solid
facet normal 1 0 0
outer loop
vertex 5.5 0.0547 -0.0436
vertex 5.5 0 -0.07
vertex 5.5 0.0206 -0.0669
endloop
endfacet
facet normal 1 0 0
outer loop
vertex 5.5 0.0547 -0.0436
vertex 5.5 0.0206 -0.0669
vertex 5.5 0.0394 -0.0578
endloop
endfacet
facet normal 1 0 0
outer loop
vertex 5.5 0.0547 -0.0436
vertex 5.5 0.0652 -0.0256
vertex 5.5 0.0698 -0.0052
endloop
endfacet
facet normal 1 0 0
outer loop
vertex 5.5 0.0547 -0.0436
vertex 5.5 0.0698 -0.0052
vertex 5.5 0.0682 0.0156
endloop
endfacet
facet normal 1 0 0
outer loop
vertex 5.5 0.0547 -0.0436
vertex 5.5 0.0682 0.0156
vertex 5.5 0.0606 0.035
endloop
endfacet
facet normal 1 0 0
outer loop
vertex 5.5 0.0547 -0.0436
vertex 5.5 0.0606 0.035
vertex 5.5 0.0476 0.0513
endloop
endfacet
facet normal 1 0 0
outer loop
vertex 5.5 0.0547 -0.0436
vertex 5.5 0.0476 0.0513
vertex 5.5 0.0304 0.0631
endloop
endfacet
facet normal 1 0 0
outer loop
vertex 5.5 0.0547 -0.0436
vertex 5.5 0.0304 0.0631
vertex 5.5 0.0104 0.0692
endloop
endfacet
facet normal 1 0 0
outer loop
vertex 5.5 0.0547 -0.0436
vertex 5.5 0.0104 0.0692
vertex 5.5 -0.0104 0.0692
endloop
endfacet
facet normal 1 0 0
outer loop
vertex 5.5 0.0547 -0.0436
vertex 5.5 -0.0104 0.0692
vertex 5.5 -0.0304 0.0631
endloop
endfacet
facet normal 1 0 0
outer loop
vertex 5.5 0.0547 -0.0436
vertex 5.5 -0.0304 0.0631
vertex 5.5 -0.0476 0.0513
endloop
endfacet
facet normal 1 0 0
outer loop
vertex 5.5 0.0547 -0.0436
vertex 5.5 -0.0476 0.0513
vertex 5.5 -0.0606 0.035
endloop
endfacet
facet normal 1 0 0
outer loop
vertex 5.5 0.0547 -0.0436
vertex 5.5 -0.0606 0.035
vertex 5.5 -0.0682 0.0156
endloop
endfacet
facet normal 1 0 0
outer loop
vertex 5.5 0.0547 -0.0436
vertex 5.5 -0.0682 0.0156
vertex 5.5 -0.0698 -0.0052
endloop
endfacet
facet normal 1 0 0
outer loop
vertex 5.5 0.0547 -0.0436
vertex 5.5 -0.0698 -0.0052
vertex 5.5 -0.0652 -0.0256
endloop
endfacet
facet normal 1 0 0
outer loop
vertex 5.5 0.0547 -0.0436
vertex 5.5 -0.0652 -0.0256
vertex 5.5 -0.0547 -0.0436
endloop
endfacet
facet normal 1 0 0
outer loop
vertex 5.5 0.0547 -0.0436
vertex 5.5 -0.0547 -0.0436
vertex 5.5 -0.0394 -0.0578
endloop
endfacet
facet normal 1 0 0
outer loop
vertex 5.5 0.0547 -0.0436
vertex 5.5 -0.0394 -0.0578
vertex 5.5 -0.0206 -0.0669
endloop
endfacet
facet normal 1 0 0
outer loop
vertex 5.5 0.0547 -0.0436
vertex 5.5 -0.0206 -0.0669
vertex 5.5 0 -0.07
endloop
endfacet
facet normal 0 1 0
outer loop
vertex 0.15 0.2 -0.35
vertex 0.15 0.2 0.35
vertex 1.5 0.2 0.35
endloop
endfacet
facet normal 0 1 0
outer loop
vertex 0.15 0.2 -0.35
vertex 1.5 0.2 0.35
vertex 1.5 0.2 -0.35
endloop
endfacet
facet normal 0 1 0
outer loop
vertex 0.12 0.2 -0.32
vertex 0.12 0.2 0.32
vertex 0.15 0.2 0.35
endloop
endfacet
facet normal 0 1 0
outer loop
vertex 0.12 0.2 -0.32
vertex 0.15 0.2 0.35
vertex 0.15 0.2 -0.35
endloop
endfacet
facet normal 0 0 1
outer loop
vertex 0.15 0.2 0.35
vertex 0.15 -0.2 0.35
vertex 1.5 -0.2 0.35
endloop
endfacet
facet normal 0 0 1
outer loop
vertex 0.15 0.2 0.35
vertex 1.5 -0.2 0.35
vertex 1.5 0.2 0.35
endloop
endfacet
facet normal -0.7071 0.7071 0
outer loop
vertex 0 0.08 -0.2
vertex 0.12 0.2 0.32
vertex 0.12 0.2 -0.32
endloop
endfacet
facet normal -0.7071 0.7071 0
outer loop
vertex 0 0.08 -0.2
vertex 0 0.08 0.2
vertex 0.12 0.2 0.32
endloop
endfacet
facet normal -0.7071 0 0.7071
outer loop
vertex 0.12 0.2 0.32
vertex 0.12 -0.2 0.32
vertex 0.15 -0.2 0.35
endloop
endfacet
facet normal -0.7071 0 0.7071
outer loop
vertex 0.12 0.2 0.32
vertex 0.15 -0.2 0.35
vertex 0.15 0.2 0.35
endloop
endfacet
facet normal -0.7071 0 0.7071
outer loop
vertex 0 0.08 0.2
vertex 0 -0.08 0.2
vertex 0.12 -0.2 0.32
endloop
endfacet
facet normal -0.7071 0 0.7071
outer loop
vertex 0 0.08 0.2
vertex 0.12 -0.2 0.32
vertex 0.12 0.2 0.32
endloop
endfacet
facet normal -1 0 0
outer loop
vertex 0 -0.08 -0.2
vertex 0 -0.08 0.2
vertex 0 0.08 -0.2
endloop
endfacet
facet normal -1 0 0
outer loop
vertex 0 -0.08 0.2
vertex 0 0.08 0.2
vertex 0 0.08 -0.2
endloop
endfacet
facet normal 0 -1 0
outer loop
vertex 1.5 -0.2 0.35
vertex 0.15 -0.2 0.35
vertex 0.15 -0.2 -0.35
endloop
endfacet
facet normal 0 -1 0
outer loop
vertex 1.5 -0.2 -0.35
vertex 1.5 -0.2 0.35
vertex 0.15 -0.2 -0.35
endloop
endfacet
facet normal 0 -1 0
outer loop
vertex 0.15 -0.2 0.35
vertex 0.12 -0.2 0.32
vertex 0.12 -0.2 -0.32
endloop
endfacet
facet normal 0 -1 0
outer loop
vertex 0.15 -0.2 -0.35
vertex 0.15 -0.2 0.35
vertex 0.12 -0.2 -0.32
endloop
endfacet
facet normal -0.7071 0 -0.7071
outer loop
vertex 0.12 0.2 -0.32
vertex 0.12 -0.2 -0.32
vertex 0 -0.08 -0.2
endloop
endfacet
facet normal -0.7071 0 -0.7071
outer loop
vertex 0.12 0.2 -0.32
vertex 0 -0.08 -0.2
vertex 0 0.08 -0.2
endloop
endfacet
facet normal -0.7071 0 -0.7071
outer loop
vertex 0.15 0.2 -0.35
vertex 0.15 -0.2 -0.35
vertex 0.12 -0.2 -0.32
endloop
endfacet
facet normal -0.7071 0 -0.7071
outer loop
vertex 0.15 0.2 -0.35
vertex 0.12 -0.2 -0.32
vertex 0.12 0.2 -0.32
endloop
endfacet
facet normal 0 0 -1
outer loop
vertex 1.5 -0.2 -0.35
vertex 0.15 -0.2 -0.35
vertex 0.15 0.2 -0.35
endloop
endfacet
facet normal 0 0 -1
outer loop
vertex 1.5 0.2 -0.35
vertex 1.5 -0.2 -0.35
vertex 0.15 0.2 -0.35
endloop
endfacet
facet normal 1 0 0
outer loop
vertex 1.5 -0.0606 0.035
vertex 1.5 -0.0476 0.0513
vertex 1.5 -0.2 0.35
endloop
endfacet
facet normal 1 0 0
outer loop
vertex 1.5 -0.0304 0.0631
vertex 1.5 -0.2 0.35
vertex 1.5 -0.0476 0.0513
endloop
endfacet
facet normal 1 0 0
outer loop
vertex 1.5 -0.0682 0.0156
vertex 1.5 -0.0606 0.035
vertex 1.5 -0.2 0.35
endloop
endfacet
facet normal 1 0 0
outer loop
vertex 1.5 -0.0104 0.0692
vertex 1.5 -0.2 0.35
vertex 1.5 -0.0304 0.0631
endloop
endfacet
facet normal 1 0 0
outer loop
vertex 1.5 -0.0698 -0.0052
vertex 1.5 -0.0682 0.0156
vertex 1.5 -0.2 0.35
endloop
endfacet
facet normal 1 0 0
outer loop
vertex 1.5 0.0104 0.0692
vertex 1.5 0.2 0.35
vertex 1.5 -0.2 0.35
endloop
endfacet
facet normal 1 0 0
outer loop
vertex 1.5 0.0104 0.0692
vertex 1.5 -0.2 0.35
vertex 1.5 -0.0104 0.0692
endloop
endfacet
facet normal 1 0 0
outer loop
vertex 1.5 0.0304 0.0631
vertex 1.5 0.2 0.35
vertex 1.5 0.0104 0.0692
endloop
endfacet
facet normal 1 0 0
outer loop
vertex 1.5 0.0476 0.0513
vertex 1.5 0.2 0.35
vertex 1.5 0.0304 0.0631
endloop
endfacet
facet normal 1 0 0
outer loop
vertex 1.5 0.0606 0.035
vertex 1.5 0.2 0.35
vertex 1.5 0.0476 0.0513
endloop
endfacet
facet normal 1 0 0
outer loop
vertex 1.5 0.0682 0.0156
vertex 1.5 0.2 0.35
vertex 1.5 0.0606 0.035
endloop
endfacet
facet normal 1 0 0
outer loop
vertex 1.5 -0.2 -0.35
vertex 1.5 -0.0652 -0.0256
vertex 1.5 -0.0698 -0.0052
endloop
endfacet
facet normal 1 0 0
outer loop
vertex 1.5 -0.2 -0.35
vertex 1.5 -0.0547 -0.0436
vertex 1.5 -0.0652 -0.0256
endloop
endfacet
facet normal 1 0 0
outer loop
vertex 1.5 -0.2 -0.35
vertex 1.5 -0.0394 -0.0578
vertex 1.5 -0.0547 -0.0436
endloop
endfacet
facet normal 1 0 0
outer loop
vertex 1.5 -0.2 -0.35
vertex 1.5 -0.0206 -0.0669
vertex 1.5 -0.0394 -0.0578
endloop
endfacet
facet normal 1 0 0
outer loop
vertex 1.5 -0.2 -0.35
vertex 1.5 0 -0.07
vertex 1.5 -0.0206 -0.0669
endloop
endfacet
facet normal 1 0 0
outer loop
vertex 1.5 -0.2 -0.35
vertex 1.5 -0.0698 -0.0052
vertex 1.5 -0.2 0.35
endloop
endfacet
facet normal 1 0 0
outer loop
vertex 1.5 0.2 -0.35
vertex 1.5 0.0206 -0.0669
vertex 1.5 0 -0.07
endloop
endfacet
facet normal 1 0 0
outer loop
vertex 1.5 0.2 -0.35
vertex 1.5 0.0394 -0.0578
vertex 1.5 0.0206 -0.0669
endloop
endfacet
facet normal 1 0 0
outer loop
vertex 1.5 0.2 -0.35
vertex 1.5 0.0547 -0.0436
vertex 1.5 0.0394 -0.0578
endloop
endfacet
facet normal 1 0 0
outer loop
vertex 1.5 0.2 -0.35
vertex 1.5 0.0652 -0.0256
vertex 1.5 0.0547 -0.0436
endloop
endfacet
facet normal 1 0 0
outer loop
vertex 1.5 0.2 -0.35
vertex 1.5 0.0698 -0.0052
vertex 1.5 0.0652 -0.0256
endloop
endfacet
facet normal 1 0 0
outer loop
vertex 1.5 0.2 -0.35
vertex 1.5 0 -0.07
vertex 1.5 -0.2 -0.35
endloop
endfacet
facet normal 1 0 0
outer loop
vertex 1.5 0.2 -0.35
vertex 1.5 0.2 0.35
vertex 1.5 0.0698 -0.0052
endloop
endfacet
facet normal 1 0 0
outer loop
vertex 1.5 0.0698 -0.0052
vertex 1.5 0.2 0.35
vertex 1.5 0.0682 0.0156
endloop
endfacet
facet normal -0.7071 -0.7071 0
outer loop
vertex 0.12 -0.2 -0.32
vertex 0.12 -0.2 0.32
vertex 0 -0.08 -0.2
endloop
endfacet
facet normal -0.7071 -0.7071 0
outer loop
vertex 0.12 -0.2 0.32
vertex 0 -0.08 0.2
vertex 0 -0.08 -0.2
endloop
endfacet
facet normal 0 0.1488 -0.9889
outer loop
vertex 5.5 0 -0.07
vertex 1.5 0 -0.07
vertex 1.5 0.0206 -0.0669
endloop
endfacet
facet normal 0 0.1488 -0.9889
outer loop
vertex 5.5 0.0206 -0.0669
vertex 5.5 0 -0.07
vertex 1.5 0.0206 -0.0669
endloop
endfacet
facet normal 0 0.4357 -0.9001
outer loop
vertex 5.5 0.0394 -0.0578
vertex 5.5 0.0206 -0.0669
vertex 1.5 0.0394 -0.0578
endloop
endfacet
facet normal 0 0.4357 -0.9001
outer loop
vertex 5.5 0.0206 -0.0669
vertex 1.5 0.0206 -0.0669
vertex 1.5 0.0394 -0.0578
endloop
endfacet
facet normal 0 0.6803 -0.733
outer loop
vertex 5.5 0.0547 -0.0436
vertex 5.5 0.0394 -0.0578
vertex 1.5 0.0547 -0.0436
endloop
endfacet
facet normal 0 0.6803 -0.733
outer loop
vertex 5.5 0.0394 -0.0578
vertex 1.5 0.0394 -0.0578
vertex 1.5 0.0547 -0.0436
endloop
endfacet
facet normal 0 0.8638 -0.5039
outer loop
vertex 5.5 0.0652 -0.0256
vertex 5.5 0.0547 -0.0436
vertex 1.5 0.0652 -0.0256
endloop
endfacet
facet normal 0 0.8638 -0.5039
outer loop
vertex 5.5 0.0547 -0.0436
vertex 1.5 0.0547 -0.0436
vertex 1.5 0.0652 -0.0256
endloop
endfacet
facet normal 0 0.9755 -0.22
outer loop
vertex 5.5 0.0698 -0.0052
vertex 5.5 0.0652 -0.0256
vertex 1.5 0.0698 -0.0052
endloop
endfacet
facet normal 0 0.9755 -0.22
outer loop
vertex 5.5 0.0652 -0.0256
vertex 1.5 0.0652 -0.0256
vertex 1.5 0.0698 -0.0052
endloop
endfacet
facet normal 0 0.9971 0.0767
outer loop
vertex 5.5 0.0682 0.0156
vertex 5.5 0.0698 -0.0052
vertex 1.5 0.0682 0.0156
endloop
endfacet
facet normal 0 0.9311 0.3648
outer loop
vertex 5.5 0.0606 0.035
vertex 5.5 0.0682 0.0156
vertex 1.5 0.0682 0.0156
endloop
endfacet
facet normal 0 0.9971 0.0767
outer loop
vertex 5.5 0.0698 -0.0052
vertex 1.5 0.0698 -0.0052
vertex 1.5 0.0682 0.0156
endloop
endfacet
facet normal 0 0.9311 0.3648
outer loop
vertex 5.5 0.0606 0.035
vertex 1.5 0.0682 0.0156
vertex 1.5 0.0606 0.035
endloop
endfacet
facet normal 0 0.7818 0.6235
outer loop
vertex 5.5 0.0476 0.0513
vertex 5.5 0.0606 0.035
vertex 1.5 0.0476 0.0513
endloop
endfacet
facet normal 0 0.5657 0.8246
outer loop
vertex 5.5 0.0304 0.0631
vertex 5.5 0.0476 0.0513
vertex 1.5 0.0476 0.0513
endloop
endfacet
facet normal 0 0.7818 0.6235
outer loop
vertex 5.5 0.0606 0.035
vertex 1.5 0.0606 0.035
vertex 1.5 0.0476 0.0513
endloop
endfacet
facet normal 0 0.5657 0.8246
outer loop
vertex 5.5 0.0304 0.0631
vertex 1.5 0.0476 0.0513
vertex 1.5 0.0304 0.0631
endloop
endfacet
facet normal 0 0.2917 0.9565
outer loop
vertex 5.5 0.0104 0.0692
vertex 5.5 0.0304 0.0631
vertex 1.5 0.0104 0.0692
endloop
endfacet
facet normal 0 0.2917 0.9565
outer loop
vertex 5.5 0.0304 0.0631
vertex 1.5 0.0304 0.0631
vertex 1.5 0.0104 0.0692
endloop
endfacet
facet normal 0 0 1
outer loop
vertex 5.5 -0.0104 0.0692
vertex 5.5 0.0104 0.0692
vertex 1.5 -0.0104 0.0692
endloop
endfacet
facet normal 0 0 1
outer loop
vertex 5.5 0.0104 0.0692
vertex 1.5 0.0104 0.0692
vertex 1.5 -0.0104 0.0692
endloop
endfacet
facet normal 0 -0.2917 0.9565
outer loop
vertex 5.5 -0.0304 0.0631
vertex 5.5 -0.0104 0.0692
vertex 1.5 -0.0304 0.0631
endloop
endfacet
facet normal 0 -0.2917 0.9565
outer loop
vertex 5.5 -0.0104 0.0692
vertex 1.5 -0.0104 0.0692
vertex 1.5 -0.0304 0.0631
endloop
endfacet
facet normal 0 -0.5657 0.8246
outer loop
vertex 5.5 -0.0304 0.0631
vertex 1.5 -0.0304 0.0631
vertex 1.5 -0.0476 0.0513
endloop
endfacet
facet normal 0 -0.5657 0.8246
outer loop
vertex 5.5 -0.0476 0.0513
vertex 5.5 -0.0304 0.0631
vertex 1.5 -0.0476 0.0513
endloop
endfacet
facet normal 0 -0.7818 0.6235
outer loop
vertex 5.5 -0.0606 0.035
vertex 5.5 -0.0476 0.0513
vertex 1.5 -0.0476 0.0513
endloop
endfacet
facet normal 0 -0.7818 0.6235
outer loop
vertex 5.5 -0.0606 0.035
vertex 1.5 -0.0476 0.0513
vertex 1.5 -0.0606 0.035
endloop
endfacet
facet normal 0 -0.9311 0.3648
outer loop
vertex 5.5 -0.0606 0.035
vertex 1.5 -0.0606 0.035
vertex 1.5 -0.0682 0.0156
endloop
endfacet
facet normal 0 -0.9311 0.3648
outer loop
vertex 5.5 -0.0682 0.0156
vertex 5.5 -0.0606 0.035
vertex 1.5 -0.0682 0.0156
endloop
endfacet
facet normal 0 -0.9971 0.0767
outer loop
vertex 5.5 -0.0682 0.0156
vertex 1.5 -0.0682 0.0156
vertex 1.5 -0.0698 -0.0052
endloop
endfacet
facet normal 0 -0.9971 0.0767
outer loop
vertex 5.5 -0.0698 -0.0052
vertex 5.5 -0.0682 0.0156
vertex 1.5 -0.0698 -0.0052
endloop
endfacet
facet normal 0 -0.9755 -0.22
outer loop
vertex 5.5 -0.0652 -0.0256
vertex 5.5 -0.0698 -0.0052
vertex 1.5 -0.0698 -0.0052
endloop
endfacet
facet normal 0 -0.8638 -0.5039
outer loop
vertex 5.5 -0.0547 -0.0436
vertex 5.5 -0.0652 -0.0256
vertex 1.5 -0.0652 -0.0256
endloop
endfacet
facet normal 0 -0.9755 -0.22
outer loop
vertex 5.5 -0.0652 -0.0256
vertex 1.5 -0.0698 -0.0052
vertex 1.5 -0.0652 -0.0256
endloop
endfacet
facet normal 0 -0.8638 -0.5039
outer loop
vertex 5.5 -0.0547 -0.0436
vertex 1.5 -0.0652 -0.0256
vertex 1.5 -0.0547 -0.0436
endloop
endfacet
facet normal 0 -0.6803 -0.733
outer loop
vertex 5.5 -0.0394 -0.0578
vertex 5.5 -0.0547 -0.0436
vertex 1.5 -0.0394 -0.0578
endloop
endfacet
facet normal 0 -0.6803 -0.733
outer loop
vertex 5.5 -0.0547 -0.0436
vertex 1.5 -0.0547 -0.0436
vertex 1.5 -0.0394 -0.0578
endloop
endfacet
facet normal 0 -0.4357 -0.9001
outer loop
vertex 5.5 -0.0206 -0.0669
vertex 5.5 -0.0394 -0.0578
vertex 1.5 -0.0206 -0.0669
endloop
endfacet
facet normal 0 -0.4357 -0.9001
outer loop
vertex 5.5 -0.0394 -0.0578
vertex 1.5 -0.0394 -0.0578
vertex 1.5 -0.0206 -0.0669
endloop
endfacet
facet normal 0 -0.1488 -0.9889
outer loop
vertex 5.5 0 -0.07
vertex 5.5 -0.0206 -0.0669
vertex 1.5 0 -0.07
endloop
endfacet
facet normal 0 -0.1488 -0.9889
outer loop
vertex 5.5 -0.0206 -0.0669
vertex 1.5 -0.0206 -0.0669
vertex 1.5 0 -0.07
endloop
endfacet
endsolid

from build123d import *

# Parameters (mm, degrees)
SKETCH1_W           = 0.7
SKETCH1_H           = 0.4
BOSS_EXTRUDE1_DEPTH = 1.5
SKETCH2_R           = 0.07
BOSS_EXTRUDE2_DEPTH = 4
CHAMFER1_SIZE       = 0.12
CHAMFER2_SIZE       = 0.15


with BuildPart() as part:
    # Sketch1 → Boss-Extrude1 (new body)
    with BuildSketch(Plane(origin=(0, 0, 0), x_dir=(0, 0, -1), z_dir=(1, 0, 0))):
        Rectangle(SKETCH1_W, SKETCH1_H)
    extrude(amount=BOSS_EXTRUDE1_DEPTH)

    # Sketch2 → Boss-Extrude2 (add)
    with BuildSketch(Plane(origin=(1.5, 0, 0), x_dir=(0, 0, -1), z_dir=(1, 0, 0))):
        Circle(SKETCH2_R)
    extrude(amount=BOSS_EXTRUDE2_DEPTH)

    # Chamfer1
    chamfer1_edges = [part.edges().sort_by_distance(p)[0] for p in [
        (0, -0.2, 0),
        (0, 0.2, 0),
    ]]
    chamfer(chamfer1_edges, length=CHAMFER1_SIZE)

    # Chamfer2
    chamfer2_edges = [part.edges().sort_by_distance(p)[0] for p in [
        (0, 0, 0.35),
        (0, 0, -0.35),
    ]]
    chamfer(chamfer2_edges, length=CHAMFER2_SIZE)


solid = part.part
